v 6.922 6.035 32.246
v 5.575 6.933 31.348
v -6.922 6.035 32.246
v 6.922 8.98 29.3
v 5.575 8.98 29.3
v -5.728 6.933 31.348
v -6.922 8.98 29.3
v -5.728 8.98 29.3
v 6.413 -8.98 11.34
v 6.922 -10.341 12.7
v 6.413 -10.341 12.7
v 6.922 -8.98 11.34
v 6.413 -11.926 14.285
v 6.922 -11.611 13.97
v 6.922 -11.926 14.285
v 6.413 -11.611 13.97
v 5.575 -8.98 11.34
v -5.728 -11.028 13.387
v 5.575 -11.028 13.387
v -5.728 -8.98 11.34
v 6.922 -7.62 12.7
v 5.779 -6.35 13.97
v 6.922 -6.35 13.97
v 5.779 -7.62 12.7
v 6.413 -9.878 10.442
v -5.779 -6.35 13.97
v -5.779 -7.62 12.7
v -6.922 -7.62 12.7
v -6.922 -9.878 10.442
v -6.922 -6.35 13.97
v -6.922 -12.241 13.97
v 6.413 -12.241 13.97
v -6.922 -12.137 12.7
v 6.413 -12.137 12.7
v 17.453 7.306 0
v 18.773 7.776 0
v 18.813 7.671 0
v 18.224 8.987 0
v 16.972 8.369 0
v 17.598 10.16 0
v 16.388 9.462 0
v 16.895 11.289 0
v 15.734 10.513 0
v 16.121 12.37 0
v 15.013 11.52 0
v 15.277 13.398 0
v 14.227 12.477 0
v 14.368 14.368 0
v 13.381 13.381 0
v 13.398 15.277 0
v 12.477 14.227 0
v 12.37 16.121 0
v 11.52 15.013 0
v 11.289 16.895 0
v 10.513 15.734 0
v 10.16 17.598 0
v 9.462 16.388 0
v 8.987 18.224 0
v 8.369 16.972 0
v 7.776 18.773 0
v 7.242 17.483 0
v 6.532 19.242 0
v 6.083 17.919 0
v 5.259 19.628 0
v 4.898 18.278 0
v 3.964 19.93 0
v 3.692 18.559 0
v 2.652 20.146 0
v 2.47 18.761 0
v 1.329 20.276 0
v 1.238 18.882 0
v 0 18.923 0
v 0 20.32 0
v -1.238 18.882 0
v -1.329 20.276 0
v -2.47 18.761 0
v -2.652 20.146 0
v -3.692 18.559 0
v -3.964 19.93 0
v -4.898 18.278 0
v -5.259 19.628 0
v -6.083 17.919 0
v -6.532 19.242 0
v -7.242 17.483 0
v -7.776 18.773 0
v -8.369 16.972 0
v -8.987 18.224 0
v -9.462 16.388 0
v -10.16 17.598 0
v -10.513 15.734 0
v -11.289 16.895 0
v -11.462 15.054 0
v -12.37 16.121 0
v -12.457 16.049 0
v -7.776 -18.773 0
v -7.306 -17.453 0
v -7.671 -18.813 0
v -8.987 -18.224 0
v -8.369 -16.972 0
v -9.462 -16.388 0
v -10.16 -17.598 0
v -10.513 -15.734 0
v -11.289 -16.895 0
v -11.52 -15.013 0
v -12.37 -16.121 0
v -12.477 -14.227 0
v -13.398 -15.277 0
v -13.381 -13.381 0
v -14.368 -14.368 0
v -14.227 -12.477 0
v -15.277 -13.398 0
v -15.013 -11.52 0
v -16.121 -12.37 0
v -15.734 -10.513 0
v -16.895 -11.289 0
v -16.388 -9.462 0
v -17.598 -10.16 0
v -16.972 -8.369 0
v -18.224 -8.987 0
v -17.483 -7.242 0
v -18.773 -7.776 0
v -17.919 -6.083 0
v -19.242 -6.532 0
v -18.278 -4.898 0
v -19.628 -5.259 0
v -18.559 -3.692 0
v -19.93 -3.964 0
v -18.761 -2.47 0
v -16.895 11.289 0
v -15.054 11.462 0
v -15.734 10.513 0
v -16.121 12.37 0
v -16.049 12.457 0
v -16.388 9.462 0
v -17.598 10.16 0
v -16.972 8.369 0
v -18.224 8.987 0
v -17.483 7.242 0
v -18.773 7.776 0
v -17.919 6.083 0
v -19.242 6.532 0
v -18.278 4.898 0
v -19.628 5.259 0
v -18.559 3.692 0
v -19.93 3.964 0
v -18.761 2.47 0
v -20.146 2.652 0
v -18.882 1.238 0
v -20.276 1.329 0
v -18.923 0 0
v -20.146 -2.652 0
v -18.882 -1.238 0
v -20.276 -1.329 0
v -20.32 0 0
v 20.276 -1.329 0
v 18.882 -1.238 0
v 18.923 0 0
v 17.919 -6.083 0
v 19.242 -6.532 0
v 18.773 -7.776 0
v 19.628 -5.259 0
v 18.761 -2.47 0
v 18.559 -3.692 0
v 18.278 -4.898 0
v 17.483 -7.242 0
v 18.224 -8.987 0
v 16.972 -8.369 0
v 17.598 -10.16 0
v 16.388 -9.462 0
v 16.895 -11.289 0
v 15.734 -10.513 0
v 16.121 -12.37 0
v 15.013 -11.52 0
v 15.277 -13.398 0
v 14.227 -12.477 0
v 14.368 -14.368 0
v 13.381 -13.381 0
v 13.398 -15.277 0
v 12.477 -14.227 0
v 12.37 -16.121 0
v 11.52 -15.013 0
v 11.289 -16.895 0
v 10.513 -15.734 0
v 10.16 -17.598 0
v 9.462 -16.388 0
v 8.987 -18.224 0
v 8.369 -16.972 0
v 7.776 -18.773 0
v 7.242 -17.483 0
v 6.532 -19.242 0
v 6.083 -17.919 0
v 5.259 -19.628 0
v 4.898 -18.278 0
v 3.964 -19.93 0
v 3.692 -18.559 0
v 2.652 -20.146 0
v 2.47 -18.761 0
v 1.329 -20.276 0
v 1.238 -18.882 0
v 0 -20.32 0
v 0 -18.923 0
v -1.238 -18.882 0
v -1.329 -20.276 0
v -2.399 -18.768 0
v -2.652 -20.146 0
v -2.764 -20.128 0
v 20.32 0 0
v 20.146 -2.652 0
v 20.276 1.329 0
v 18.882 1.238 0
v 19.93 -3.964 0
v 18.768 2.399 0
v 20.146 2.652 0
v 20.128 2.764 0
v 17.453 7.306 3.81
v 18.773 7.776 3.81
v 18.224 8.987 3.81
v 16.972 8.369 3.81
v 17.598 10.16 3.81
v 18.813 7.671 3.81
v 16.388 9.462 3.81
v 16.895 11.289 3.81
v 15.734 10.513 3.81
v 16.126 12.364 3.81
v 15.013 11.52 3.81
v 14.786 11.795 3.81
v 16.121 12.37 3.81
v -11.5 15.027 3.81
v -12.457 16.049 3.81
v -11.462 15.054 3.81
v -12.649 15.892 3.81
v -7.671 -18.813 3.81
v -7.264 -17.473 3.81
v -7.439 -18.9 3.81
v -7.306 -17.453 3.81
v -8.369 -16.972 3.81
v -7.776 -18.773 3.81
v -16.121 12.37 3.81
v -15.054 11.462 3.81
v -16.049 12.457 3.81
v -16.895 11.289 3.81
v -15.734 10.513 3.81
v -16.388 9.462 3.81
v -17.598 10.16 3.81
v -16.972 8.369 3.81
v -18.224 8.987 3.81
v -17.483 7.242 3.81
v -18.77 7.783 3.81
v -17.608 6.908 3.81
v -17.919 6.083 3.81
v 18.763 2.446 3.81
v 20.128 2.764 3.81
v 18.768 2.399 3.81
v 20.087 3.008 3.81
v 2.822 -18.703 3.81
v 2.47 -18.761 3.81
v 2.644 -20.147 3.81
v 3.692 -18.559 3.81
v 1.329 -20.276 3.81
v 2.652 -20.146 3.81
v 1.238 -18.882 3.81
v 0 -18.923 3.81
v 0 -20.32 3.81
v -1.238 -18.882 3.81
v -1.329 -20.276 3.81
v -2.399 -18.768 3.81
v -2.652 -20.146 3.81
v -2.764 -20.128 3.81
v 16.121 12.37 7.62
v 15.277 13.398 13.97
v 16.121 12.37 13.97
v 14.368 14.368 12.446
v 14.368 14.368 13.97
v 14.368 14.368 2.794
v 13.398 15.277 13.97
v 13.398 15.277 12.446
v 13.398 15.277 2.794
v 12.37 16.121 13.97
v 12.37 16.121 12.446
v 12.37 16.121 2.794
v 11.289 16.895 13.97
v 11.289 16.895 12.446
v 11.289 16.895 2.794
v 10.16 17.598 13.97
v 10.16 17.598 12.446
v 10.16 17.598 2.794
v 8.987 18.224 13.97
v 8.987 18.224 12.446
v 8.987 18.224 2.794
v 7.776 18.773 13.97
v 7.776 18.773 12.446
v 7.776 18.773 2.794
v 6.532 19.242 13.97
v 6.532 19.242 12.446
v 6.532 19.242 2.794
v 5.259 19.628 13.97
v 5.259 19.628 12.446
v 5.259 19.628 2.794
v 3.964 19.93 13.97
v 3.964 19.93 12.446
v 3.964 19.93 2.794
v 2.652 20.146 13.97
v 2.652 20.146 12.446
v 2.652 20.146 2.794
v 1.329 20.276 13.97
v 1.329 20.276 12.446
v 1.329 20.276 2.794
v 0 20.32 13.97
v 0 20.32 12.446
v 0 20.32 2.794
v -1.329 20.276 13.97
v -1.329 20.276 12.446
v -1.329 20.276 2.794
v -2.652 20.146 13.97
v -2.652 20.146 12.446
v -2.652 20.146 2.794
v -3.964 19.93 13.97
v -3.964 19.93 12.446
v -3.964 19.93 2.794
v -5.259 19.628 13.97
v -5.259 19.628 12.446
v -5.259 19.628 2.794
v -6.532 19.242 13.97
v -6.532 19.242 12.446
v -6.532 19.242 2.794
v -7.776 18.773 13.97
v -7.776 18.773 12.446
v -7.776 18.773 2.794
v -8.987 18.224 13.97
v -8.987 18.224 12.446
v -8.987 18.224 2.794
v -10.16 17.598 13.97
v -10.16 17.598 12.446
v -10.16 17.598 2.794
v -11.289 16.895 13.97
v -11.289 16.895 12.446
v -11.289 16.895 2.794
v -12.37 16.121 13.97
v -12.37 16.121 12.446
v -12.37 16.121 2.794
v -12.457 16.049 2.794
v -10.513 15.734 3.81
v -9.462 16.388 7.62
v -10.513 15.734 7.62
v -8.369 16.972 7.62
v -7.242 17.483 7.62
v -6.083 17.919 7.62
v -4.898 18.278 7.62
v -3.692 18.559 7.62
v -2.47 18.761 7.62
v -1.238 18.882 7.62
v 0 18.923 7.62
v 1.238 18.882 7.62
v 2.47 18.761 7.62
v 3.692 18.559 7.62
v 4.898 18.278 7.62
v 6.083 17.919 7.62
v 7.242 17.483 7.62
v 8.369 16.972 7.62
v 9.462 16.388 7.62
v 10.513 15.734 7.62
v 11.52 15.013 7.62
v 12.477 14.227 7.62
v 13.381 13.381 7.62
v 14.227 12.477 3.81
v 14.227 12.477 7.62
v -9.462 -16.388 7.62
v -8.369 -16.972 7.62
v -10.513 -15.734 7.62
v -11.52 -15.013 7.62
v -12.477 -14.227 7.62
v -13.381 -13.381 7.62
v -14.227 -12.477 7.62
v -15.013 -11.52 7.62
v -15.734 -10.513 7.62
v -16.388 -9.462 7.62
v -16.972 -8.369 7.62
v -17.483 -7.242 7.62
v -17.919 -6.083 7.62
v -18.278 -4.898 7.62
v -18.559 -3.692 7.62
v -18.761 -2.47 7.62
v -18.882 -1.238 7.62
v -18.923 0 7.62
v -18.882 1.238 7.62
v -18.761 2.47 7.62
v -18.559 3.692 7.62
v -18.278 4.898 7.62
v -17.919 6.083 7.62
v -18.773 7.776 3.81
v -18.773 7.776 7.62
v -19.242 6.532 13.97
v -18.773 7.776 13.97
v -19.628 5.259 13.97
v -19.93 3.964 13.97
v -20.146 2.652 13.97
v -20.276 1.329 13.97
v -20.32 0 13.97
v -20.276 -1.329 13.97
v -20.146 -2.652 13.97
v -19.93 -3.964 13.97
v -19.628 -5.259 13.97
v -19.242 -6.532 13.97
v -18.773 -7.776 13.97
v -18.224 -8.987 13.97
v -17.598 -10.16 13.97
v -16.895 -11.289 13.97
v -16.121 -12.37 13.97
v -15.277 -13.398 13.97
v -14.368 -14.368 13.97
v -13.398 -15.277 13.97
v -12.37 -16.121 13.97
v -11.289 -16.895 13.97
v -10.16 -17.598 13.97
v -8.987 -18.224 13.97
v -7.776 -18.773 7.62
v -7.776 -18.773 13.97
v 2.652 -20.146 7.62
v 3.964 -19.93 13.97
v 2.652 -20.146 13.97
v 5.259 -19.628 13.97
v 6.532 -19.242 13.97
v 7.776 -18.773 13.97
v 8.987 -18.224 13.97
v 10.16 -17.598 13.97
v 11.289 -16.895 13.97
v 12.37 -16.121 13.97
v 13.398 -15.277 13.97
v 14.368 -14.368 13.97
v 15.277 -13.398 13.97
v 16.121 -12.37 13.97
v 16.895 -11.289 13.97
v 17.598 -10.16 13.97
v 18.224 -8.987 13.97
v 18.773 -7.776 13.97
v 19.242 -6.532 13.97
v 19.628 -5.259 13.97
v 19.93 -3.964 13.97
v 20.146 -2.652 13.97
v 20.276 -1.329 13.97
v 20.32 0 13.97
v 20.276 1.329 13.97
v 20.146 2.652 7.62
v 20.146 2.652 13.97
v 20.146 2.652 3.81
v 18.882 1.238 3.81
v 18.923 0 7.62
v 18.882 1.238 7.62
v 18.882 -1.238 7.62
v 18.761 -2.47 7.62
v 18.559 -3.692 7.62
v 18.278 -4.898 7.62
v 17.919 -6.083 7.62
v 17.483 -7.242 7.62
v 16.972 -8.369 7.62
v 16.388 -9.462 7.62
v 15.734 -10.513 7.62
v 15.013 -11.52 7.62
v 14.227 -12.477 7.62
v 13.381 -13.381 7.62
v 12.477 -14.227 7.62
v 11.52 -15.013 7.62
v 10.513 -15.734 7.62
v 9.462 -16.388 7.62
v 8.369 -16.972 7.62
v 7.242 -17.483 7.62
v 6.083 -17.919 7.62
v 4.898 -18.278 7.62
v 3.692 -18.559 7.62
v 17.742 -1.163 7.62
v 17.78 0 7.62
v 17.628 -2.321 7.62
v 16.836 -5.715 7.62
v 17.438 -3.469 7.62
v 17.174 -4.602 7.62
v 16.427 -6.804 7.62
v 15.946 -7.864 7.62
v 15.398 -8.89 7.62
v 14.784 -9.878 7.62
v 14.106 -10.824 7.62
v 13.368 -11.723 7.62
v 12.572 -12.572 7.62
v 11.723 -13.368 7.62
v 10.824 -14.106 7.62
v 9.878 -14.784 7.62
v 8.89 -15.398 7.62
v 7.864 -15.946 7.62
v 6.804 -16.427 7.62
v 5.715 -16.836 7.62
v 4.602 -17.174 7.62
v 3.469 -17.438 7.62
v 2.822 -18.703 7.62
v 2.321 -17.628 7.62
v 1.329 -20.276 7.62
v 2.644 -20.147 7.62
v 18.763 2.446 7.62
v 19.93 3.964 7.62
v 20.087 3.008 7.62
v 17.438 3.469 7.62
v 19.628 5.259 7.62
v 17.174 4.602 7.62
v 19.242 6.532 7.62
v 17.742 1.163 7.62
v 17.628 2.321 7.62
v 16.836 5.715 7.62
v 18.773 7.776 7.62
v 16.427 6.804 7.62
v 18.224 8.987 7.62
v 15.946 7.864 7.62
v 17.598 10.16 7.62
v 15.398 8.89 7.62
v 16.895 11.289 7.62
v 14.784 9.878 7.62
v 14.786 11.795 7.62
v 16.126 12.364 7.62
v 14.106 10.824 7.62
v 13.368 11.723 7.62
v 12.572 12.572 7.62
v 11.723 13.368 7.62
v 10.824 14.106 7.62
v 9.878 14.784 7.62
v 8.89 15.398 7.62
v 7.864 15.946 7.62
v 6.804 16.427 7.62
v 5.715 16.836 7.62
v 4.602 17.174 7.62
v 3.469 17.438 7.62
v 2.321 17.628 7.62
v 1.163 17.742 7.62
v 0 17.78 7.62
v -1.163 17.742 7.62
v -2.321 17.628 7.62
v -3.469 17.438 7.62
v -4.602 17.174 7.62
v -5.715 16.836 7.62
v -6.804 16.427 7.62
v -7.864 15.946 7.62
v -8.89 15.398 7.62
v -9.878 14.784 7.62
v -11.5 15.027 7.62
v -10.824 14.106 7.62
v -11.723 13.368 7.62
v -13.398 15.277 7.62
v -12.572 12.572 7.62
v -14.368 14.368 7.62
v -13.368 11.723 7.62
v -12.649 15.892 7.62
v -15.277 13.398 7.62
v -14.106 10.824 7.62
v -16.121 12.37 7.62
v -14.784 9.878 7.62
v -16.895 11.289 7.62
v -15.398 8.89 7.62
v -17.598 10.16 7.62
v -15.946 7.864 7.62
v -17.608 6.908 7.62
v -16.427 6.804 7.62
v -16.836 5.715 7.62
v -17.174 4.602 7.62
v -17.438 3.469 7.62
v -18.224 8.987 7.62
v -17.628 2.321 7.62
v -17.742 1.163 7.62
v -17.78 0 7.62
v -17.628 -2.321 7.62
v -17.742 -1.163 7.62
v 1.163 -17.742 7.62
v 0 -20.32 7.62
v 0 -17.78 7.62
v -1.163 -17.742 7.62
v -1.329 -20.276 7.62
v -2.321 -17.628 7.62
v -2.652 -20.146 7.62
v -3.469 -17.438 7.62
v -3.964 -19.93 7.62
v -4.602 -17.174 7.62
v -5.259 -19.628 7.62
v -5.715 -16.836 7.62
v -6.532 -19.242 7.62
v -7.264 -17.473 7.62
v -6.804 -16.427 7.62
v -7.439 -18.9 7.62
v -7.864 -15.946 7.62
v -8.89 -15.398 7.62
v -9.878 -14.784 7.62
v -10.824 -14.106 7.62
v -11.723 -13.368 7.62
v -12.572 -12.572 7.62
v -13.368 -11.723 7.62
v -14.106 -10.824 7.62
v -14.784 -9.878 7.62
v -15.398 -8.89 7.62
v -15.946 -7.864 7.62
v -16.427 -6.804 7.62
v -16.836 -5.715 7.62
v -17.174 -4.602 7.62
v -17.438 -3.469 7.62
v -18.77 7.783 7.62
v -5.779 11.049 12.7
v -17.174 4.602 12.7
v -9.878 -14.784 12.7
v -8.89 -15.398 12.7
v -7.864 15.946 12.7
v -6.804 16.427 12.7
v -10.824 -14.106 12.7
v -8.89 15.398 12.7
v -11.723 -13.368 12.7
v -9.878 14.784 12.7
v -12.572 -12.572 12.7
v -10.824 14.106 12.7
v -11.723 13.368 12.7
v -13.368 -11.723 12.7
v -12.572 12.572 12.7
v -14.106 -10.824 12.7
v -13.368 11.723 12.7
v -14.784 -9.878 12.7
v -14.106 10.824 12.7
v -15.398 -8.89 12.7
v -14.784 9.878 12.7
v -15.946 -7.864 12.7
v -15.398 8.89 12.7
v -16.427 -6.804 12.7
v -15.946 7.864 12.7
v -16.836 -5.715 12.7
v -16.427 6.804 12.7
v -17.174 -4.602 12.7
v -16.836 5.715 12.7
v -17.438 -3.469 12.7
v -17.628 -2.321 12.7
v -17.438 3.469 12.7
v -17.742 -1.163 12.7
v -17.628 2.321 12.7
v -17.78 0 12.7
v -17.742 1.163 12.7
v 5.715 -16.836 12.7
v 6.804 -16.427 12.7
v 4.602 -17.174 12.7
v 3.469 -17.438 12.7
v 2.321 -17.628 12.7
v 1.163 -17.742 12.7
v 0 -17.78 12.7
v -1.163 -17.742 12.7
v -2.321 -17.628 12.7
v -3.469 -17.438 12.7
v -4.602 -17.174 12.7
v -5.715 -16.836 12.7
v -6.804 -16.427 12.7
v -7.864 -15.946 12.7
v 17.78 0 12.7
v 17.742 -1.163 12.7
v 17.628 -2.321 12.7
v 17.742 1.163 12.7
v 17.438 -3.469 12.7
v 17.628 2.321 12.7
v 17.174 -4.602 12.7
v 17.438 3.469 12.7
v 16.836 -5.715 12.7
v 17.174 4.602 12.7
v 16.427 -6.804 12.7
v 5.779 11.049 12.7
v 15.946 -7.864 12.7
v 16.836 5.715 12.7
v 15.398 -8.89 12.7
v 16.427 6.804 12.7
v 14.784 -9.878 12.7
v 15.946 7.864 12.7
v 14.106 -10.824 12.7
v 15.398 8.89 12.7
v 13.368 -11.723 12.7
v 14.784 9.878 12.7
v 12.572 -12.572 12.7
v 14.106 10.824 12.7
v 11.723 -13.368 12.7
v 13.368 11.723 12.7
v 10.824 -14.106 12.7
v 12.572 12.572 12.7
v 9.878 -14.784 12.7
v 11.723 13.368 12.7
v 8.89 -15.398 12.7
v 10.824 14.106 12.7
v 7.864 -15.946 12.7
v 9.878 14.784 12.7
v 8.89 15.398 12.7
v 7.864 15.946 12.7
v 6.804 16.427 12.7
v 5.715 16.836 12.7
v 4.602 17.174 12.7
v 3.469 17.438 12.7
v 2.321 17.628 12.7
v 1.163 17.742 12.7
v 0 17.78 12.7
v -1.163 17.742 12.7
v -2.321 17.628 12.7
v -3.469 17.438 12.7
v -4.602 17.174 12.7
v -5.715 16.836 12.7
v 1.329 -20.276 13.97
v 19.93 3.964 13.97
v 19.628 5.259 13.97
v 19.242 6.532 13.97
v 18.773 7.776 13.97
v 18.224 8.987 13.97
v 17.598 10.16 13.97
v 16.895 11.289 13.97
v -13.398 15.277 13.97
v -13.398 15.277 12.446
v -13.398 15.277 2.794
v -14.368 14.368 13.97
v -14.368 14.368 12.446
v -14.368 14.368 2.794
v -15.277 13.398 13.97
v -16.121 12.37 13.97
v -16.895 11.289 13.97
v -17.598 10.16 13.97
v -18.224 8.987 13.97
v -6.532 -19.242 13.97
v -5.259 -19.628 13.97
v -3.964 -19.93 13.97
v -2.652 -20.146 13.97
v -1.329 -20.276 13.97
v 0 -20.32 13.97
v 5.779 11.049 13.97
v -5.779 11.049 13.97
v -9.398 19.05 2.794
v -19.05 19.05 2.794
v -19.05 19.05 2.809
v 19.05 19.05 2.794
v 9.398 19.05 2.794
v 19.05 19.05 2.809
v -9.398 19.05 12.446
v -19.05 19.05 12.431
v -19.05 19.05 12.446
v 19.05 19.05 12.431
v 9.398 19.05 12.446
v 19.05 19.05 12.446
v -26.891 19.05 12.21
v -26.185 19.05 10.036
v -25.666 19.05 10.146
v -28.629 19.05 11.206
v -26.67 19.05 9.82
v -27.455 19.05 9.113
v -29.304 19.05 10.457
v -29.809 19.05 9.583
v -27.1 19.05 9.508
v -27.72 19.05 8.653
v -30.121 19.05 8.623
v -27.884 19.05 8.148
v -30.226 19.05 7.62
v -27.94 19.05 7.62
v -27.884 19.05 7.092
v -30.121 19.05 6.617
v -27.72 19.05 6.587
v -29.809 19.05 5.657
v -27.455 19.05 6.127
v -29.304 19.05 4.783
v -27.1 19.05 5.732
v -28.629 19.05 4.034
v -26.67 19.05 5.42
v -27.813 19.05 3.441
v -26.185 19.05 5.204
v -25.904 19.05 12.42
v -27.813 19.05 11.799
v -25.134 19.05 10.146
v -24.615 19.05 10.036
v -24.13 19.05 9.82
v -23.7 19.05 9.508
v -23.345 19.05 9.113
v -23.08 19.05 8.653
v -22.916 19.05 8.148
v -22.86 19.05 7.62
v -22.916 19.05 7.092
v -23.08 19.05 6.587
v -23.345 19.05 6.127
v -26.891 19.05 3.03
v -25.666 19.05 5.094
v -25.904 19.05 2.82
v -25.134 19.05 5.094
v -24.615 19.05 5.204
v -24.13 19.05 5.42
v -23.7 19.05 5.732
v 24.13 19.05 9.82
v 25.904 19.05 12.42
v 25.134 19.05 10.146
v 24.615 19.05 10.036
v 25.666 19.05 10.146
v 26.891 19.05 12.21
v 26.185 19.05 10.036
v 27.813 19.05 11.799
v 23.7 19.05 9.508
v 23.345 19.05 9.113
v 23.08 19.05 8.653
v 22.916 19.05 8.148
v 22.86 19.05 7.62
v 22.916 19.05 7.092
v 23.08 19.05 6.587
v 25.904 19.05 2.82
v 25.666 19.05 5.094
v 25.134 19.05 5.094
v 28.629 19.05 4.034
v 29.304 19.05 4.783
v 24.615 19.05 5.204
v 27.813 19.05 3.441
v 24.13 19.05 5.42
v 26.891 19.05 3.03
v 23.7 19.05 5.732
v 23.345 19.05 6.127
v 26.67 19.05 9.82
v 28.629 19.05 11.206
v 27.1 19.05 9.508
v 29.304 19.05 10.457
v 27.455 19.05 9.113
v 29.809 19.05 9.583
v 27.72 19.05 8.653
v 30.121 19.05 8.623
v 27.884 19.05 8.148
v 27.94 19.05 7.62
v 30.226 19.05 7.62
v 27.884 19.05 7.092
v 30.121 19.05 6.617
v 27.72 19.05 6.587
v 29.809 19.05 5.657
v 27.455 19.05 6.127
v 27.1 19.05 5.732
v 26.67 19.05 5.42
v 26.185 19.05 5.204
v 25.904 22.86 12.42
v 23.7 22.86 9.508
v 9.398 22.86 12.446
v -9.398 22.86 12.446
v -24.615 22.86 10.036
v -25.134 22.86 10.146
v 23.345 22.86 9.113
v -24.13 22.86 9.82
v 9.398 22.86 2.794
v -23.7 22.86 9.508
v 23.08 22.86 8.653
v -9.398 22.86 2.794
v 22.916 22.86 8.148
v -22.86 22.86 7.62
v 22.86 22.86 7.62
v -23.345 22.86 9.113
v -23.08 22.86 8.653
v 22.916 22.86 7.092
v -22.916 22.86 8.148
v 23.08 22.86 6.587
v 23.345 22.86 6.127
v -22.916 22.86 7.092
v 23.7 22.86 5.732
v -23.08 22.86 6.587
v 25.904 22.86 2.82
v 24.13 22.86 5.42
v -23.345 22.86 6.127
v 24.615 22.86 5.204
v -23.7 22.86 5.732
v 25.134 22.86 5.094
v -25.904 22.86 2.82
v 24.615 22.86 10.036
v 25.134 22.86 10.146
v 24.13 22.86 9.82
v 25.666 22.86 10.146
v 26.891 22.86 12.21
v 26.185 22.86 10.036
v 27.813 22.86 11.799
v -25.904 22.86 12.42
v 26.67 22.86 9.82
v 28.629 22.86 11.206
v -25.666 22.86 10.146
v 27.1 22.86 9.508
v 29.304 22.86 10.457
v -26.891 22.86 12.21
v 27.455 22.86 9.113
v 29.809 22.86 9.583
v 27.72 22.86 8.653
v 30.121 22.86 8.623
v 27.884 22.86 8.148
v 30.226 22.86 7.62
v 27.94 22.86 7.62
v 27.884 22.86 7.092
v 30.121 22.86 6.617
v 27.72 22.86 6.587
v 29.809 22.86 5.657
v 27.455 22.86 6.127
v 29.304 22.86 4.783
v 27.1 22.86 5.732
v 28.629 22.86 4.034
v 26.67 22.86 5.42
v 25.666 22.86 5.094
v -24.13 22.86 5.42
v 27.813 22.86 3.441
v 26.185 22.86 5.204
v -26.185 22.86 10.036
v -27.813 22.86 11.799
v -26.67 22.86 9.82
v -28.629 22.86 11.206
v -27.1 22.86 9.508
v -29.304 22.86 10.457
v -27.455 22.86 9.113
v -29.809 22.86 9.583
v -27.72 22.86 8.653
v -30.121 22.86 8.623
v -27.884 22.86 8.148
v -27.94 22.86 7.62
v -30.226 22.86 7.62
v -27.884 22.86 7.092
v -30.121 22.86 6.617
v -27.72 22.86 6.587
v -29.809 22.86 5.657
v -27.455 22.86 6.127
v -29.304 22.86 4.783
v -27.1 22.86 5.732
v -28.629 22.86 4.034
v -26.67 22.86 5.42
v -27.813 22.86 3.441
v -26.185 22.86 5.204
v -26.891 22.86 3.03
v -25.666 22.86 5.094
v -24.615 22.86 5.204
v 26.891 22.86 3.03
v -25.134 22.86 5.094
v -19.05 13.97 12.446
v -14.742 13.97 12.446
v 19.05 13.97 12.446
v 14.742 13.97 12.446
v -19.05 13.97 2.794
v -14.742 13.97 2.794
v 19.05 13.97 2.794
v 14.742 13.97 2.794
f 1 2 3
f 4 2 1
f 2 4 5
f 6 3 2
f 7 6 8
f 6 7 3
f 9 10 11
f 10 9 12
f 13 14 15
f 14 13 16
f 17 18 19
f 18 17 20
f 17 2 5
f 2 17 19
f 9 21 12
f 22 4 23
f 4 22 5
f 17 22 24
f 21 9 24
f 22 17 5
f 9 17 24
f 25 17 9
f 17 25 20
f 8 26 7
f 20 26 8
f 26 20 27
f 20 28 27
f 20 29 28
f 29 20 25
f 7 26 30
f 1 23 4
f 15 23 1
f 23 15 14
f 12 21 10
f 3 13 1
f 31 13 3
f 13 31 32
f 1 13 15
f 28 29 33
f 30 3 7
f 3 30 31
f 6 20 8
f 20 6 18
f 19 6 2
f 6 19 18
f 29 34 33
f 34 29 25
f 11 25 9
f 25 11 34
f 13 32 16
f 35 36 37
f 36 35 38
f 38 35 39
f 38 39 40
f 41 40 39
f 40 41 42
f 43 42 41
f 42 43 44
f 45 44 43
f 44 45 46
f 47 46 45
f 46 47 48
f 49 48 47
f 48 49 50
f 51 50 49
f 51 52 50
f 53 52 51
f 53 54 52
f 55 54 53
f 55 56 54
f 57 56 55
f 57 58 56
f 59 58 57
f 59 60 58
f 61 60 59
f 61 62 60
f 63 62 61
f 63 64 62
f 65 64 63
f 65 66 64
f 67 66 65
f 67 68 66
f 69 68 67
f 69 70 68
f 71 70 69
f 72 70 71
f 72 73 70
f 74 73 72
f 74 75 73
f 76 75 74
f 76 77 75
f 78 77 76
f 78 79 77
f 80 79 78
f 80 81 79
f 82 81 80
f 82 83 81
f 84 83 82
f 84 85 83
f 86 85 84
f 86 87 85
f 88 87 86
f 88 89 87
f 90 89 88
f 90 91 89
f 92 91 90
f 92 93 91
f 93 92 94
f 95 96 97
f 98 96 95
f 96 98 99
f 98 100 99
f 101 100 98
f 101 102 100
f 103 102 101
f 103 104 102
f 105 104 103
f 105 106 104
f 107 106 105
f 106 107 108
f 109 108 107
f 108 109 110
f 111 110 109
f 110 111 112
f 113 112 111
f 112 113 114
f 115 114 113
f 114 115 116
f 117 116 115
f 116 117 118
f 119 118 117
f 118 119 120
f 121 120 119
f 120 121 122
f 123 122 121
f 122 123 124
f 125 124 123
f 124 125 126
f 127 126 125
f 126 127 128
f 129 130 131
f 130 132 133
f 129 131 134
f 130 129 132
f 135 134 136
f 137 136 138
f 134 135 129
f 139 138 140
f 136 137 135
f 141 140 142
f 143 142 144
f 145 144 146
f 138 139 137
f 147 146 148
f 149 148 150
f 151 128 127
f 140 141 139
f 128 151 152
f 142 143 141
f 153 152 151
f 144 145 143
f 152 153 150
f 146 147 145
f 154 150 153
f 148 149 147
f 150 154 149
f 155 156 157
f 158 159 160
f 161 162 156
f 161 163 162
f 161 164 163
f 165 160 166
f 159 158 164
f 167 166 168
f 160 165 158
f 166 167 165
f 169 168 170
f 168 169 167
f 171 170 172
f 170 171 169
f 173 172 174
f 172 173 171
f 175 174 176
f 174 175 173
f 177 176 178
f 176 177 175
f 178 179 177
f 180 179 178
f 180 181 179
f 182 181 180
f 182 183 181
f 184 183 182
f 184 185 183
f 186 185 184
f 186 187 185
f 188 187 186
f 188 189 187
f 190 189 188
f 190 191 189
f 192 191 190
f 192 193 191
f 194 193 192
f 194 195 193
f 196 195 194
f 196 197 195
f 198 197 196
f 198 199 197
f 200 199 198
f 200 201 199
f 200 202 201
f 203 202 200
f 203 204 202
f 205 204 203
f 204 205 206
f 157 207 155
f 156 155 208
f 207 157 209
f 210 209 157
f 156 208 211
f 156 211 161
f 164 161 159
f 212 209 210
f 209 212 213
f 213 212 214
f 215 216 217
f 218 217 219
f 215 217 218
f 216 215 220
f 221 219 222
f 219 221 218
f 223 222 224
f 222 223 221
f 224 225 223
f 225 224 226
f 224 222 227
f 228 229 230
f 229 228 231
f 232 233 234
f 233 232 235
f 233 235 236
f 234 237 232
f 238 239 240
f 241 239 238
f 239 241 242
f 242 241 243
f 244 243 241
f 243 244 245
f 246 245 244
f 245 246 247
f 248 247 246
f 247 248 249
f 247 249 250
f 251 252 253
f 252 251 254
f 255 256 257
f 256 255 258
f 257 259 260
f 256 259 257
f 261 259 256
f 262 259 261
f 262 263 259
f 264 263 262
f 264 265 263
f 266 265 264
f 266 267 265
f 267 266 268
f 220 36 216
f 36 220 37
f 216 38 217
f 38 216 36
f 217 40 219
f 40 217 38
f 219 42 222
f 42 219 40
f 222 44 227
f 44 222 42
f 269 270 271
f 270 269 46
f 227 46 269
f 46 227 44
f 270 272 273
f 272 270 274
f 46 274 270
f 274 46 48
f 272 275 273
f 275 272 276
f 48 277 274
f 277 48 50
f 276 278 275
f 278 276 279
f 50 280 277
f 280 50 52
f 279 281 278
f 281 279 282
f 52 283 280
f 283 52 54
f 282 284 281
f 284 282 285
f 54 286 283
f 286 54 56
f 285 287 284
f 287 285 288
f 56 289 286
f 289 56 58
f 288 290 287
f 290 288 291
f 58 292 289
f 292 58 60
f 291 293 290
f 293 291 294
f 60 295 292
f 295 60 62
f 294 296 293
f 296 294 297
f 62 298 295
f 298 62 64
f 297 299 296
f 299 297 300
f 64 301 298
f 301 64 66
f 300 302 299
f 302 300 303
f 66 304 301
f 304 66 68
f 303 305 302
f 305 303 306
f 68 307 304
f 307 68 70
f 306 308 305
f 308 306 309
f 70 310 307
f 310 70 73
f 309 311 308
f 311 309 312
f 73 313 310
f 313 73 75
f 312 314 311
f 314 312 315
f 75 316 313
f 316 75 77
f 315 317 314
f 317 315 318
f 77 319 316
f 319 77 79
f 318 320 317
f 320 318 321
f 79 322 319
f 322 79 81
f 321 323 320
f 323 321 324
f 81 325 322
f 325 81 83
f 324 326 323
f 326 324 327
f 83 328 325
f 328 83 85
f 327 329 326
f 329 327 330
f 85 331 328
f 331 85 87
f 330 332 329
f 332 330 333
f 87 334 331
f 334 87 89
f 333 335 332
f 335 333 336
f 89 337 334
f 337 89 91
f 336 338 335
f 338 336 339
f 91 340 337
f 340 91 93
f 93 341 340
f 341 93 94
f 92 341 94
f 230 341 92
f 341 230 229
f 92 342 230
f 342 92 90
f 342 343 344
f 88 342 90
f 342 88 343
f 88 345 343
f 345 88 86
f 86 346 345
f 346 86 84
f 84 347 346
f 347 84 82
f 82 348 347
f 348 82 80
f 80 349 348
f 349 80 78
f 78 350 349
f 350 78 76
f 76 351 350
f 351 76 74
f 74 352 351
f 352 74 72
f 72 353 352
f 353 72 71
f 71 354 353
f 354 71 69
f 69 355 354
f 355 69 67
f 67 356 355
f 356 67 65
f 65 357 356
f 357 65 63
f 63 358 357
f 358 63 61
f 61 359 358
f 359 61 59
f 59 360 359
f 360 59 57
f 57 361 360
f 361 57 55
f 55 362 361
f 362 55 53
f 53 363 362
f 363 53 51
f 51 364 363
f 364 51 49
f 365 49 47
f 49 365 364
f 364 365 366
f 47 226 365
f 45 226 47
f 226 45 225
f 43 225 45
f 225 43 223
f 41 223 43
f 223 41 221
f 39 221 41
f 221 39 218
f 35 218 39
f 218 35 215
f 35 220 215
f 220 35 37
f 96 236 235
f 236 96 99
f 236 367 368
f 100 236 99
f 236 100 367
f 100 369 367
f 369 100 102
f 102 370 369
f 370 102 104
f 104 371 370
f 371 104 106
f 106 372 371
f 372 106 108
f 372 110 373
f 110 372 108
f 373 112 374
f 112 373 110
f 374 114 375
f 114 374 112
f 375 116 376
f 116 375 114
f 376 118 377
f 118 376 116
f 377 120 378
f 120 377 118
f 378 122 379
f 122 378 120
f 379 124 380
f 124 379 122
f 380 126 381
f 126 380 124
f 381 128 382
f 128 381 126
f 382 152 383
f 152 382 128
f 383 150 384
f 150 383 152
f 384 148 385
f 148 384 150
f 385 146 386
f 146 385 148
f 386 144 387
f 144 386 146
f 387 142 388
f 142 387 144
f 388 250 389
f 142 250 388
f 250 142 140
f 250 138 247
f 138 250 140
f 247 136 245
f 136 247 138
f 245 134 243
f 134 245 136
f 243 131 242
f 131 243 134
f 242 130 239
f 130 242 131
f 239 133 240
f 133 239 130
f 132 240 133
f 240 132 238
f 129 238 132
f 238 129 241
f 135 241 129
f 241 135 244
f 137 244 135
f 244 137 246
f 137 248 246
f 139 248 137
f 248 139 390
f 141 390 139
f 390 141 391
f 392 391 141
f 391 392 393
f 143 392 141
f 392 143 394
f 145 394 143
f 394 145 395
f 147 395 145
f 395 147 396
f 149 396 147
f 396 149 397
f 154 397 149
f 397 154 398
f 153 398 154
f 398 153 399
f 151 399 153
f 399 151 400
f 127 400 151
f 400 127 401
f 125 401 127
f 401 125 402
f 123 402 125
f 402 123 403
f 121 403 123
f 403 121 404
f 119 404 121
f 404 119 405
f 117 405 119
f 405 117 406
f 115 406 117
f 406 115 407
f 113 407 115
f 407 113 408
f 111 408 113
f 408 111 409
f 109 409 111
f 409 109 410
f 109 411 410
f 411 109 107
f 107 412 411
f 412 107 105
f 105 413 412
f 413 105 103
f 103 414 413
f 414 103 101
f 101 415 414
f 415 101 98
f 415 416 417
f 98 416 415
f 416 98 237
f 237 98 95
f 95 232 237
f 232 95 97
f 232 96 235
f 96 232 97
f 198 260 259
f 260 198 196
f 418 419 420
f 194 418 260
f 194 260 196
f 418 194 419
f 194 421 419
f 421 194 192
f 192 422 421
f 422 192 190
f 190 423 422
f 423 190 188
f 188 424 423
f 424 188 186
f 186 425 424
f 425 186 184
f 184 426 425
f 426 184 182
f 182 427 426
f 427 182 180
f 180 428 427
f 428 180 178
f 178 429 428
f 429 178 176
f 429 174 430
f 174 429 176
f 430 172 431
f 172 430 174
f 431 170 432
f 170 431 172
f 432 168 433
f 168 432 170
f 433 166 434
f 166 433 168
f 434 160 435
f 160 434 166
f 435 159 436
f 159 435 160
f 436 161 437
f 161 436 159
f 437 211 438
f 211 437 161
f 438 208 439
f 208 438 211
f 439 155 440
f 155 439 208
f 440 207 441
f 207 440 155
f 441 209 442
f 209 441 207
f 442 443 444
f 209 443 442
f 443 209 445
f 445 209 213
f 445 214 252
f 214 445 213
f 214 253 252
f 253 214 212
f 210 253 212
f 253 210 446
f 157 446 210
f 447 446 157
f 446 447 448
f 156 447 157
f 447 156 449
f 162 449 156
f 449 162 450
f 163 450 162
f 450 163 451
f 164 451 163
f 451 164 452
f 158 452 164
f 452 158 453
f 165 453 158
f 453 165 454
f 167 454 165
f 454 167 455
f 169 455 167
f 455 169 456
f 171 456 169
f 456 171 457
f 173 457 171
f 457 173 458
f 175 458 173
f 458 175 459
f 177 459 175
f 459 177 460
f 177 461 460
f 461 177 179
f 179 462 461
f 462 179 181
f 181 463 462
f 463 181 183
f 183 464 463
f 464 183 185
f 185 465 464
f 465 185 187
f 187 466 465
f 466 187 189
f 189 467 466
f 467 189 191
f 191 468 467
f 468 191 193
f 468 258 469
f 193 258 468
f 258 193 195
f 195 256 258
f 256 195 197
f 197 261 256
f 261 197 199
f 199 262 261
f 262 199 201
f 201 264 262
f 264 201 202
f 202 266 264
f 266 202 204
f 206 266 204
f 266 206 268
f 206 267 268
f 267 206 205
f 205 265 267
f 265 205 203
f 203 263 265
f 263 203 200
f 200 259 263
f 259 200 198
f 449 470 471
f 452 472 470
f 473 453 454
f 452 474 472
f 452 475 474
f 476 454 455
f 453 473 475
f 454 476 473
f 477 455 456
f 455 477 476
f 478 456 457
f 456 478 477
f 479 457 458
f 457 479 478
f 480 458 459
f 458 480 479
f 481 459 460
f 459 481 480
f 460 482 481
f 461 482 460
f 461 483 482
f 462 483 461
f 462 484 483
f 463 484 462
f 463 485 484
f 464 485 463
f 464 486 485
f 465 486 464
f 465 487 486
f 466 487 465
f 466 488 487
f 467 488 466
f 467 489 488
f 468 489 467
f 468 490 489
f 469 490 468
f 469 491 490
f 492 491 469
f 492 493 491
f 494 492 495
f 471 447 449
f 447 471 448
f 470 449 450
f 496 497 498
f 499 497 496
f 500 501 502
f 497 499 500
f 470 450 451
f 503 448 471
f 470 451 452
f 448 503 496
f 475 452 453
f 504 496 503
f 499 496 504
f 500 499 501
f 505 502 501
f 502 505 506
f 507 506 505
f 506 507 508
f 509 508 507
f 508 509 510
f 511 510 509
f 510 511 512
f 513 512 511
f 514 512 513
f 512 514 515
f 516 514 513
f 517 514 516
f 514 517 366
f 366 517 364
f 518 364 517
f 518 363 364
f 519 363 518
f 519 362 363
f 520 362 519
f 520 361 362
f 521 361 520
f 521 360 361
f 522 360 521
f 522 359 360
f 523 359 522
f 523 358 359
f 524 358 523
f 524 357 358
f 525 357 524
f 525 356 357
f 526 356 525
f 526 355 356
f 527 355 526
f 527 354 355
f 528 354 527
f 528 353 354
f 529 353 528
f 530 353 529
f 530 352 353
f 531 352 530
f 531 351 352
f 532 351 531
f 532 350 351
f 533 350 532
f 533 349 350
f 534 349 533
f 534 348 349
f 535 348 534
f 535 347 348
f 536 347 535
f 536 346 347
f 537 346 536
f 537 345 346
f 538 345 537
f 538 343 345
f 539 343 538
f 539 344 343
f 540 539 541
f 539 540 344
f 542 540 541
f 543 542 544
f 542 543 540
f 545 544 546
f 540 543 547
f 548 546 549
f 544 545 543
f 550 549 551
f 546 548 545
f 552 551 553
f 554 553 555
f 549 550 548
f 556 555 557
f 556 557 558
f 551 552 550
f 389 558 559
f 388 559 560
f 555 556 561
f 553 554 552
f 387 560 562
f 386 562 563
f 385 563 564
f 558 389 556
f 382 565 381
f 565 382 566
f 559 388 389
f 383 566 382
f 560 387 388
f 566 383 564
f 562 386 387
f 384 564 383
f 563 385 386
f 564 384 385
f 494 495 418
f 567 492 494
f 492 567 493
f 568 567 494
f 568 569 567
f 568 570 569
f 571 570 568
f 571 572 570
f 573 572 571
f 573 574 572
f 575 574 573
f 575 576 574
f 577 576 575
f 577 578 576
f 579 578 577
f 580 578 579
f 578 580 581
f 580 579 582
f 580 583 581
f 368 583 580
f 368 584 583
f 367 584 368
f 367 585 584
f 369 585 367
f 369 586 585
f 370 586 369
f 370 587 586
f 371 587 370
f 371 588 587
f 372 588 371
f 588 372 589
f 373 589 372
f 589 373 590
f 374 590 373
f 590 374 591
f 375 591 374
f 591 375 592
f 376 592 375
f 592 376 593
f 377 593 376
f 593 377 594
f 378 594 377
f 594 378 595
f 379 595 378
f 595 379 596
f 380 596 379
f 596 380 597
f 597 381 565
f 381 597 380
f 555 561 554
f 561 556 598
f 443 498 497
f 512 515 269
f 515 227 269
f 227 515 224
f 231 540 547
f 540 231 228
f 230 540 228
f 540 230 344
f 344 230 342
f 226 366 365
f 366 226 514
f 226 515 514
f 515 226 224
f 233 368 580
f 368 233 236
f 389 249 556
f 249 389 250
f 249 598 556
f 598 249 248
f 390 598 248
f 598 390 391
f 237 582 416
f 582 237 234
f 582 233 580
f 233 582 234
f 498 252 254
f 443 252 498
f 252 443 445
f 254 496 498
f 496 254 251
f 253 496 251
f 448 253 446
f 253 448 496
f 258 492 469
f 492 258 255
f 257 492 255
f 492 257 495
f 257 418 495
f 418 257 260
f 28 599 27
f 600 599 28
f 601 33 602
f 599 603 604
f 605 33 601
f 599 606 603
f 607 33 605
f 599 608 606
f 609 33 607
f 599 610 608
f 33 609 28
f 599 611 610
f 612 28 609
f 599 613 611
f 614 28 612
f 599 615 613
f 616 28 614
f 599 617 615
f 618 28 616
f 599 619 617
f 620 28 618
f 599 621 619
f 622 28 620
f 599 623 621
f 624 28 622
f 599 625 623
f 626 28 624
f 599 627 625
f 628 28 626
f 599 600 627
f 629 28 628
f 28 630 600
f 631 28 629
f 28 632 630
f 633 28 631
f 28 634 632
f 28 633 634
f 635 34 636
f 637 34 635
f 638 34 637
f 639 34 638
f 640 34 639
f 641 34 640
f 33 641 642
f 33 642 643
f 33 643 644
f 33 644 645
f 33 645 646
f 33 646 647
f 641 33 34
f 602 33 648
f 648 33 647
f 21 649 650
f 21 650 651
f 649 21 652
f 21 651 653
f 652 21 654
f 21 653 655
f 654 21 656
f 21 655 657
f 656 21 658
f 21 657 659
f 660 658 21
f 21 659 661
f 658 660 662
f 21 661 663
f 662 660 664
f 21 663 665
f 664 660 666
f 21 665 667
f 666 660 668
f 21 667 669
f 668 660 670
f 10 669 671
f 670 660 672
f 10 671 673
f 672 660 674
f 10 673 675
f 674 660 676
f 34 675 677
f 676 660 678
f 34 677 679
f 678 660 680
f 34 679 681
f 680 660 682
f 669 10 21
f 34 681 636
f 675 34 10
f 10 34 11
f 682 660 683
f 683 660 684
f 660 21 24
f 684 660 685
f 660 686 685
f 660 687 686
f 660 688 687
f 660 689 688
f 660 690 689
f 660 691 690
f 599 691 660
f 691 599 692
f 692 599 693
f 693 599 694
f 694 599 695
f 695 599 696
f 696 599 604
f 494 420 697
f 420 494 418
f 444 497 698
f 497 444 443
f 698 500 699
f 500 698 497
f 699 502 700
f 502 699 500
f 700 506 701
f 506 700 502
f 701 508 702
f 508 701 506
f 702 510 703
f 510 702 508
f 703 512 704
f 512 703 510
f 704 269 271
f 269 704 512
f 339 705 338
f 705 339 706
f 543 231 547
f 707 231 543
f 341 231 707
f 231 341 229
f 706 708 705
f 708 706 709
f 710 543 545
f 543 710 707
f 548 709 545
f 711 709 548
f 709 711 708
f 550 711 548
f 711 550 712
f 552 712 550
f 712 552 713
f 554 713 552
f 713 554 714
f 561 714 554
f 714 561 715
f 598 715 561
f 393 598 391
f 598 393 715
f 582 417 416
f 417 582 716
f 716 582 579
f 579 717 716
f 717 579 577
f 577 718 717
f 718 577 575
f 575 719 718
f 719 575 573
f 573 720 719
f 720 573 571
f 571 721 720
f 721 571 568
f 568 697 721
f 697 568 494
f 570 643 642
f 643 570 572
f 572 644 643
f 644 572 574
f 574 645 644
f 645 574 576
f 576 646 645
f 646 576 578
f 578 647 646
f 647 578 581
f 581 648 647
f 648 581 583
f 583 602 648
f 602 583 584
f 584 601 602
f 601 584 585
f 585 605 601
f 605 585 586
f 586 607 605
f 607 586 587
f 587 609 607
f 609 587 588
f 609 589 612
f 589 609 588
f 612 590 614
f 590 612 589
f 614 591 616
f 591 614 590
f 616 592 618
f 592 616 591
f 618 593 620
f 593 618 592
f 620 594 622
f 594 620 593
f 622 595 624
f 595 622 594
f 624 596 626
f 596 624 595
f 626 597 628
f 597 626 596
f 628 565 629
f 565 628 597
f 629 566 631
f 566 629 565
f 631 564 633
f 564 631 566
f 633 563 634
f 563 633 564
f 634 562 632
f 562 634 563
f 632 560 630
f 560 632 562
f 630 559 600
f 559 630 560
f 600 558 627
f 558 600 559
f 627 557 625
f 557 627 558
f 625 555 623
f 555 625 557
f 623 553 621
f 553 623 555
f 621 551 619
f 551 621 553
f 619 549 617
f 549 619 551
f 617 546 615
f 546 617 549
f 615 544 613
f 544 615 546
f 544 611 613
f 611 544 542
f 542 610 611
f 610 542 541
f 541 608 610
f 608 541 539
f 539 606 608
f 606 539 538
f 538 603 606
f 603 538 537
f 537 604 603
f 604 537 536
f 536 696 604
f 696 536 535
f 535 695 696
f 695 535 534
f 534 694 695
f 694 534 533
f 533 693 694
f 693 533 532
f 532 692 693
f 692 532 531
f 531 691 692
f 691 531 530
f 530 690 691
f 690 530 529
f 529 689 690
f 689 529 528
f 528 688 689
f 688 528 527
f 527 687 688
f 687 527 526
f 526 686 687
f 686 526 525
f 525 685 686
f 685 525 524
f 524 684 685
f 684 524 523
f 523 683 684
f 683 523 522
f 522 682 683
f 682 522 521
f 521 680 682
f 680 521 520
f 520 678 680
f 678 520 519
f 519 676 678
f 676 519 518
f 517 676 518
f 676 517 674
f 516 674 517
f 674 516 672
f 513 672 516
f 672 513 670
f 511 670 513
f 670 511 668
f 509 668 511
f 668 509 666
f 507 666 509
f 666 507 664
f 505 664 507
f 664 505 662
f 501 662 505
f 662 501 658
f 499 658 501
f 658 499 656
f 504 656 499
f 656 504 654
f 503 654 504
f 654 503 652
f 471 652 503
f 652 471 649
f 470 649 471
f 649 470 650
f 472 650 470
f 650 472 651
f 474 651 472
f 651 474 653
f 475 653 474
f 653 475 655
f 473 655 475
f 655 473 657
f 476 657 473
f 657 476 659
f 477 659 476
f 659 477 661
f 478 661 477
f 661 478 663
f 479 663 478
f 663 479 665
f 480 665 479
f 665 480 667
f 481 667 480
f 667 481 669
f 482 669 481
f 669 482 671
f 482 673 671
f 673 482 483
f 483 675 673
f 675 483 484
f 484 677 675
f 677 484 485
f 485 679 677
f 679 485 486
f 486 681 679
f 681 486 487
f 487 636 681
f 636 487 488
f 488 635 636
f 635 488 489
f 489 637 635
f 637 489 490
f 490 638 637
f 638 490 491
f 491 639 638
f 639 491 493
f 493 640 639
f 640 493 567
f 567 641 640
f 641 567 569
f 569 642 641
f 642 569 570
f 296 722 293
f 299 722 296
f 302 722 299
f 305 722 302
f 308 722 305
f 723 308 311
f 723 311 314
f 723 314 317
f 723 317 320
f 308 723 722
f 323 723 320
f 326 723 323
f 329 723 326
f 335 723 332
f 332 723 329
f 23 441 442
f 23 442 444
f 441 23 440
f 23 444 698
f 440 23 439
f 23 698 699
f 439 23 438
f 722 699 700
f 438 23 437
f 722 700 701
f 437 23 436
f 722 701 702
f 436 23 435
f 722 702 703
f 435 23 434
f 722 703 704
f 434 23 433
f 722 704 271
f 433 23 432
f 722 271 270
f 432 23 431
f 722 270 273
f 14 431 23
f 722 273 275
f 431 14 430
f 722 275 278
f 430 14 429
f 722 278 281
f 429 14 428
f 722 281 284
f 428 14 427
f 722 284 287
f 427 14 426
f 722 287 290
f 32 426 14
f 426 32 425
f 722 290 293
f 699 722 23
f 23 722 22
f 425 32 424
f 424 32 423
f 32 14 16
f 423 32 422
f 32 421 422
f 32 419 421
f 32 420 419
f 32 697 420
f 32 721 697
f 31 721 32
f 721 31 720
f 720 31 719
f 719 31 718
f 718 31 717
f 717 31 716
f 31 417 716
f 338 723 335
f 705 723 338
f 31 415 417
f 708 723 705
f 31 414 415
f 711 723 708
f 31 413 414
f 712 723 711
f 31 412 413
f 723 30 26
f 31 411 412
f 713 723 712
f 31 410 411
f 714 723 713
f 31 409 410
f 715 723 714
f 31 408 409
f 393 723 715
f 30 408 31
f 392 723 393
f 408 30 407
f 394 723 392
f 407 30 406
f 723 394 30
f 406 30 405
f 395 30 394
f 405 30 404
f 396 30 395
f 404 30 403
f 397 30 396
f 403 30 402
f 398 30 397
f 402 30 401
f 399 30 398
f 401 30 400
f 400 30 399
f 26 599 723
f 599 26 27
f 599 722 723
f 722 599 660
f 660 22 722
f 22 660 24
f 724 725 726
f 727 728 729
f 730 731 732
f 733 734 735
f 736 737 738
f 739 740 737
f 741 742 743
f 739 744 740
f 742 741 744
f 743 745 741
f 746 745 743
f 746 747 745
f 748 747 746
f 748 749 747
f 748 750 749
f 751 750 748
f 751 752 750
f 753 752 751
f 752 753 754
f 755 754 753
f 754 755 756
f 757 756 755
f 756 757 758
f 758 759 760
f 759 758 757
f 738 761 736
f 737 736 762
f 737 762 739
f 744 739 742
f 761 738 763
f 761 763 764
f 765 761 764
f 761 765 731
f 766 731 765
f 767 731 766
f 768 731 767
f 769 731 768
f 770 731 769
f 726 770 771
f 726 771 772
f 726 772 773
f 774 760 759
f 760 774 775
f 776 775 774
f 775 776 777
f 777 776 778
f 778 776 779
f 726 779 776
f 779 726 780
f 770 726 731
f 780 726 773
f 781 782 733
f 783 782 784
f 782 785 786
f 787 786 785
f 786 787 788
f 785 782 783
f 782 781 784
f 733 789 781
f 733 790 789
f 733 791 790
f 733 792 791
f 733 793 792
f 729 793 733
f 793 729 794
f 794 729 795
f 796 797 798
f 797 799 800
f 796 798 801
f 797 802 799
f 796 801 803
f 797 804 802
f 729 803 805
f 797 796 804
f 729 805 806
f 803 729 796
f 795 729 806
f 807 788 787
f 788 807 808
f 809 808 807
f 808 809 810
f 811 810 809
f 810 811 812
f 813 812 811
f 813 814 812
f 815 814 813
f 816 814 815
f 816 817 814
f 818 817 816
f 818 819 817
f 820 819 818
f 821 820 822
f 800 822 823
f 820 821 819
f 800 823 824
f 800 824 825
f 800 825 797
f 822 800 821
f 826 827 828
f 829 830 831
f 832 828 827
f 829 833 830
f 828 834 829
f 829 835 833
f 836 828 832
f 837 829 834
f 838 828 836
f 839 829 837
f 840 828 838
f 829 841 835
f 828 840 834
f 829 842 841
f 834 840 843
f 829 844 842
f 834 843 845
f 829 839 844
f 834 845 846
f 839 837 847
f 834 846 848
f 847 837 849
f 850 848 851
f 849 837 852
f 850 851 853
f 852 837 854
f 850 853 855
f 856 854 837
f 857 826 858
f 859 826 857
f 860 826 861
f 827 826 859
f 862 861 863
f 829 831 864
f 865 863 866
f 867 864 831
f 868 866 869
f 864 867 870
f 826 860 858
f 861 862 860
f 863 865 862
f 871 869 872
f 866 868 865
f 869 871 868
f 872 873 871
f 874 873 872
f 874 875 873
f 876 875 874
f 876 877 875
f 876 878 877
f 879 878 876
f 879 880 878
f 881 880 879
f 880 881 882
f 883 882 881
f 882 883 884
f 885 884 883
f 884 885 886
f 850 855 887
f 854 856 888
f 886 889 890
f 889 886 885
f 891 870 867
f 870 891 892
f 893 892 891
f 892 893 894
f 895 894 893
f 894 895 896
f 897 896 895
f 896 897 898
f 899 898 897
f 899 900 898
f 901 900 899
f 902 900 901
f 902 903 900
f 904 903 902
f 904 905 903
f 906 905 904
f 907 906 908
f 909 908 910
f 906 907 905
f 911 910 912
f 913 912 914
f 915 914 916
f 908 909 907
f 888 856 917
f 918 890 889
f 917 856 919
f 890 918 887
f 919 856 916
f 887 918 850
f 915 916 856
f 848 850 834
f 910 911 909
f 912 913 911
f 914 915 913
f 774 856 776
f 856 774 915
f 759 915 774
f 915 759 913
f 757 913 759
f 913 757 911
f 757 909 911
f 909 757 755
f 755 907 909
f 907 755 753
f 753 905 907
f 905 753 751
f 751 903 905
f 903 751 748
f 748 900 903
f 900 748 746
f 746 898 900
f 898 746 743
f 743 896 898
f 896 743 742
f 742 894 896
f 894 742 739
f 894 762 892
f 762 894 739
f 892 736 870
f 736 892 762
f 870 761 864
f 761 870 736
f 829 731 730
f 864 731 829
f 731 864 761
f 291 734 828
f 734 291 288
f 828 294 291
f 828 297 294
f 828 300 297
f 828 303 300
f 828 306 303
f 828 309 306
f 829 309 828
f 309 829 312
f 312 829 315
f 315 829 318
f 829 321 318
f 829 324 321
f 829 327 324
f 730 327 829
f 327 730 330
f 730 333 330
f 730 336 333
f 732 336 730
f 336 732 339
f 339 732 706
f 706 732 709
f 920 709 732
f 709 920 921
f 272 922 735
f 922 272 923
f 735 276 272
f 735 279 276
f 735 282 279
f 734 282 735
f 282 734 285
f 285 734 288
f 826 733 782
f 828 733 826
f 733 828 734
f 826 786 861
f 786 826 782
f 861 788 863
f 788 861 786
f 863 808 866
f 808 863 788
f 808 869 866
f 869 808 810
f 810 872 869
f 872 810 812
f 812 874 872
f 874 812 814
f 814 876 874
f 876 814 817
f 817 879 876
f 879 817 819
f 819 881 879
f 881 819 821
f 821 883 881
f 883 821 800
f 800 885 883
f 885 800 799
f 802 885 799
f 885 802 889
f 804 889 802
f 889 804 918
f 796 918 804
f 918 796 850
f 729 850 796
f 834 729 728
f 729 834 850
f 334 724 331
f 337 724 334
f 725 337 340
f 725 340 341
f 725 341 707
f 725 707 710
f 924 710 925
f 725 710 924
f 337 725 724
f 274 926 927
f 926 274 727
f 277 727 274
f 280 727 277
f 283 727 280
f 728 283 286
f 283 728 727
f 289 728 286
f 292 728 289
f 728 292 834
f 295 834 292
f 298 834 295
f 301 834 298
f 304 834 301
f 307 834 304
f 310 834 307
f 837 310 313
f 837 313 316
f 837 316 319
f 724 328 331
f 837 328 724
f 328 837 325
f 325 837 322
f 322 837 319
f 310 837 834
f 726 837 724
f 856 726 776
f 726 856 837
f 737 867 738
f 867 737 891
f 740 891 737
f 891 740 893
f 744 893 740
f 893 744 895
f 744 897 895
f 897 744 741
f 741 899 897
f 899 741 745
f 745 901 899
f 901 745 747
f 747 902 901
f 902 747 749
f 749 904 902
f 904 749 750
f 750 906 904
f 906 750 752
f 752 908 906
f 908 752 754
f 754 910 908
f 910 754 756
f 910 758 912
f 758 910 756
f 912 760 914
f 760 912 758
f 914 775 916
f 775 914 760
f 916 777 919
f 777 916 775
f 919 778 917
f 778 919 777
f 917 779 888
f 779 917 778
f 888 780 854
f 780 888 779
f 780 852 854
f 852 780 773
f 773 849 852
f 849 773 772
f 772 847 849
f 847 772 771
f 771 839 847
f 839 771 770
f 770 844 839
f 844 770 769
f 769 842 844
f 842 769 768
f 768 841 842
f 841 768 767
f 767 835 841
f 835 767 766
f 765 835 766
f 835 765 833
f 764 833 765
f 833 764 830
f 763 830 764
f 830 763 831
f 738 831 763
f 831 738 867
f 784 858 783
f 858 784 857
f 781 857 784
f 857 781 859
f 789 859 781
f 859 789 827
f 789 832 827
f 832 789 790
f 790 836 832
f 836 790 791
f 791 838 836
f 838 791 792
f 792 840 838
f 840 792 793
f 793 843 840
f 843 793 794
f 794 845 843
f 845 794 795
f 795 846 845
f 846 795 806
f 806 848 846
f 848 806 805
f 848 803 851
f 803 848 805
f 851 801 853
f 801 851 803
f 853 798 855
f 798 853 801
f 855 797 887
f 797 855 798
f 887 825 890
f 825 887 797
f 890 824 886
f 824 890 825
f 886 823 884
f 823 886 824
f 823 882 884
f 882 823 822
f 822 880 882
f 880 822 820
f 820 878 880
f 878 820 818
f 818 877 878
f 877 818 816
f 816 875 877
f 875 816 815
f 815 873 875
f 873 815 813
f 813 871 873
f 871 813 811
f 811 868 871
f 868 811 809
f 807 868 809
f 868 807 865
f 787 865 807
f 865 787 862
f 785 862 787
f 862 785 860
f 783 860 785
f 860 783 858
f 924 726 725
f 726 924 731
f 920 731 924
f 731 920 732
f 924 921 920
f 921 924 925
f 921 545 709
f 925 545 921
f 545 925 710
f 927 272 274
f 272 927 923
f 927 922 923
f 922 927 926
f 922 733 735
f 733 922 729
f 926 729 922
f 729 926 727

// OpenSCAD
ViewScale = [0.0254, 0.0254, 0.0254];

module cutouts()
{
   difference() {
        circle(1600/2, $fn=96);
        circle(1490/2, $fn=96);
        // tab
        rotate([0, 0, 45]) 
        translate([0, 700, 0])
        square([200, 200], center=true);
        // tab
        rotate([0, 0, 165]) 
        translate([0, 700, 0])
        square([200, 200], center=true);
        // tab
        rotate([0, 0, 285]) 
        translate([0, 700, 0])
        square([200, 200], center=true);
    }
}

module cutouts2()
{
   difference() {
        circle(1600/2, $fn=96);
        circle(1490/2, $fn=96);
        // tab
        rotate([0, 0, 53]) 
        translate([0, 700, 0])
        square([400, 200], center=true);
        // tab
        rotate([0, 0, 173]) 
        translate([0, 700, 0])
        square([400, 200], center=true);
        // tab
        //#rotate([0, 0, 240]) 
        rotate([0, 0, 293]) 
        translate([0, 700, 0])
        square([400, 200], center=true);
    }
}

module bodymain()
{
    difference() {
        circle(1600/2, $fn=96);
        circle(1400/2, $fn=96);
    }
}

//module bodycutout()
//{
//    difference() {
//        circle(1460/2, $fn=96);
//        circle(1360/2, $fn=96);
//        *square([1020, 1020], center=true);
//        translate([0, 700, 0])
//        square([400, 200], center=true);
//        scale([1.3,1.3,1.3])
//        translate([0, 500, 0])
//        square([400, 200], center=true);
//        //rotcutouts();
//    }
//}

module bodycutout2()
{
    difference() {
        circle(1460/2, $fn=96);
        circle(1360/2, $fn=96);
        scale([1.3,1.3,1.3])
        translate([0, 500, 0])
        square([400, 200], center=true);
        //rotcutouts();
    }
}

//module ledframe2()
//{
//    difference() {
//    square([1030, 1030], center=true);
//    square([800, 800], center=true);
//    rotcutouts();
////    translate([0, 500, 0])
////    square([400, 200], center=true);
//    }
//}
//
//module ledframe1()
//{
//    difference() {
//        square([1030, 1030], center=true);
//        square([900, 900], center=true);
//        rotcutouts();
//    }
//}

//module support()
//{
//    difference() {
//    square([860, 860], center=true);
//    square([760, 760], center=true);
//    }
//}

module mirror()
{
    translate([-525/2, 0, 500])
    rotate([135, 0, 0]) {
        translate([-10, 0, -500]) {
        linear_extrude(1000)
        difference() {
            square([545, 164]);
            translate([94/2, 0, 0])
            square([445, 114]);
        }
        translate([0, 0, 1000])
        linear_extrude(50)
        square([525, 164]);
    }}
}

module cap() 
{
    difference() {
        circle(1600/2, $fn=96);
        square([455, 870], center=true);
    }
}

module vexmount1()
{
    difference() {
        hull() {
            circle(380/2);
            translate([820, 0, 0])
            square([380, 380], center=true);
        }
        circle(200/2);
    }
}


module vexmount()
{
    linear_extrude(150) {
        vexmount1();
        translate([2000, 0, 0])
        rotate([0, 180, 0])
        vexmount1();
    }
}

module mountsupport()
{
    difference() {
        translate([0, 650, 0])
        square([1500, 200], center=true);
        //circle(1490/2, $fn=96);
        circle(1600/2, $fn=96);
    }
}

module tabbedmirrormount()
{

    translate([0, 0, 0])
    linear_extrude(150)
    cutouts();

    translate([0, 0, 150])
    linear_extrude(150)
    cutouts2();

    translate([0, 0, 300])
    linear_extrude(200)
    bodymain();

    translate([0, 0, 500])
    linear_extrude(50)
    cap();

    translate([0, 0, 300])
    mirror();

    #translate([-1000, 750, 300])
    rotate([-90, 0, 0])
    vexmount();

    translate([0, 0, 110])
    linear_extrude(380)
    mountsupport();

}

module tab()
{
    // tab big bit
    *linear_extrude(160)
    intersection() {
        difference() {
            circle(1660/2, $fn=96);
            circle(1460/2, $fn=96);
        }
        rotate([0, 0, 52]) 
        translate([0, 700, 0])
        square([380, 260], center=true);
    }
    //translate([0, 0, 160])
    // tab little bit
    linear_extrude(130)
    intersection() {
        difference() {
            circle(1600/2, $fn=96);
            circle(1460/2, $fn=96);
        }
        rotate([0, 0, 45]) 
        translate([0, 700, 0])
        square([180, 300], center=true);
    }
}

module tabs()
{
    tab();
    rotate([0, 0, 120])
    tab();
    rotate([0, 0, 240])
    tab();
}

module tabbedlensmount() 
{
    // base
    linear_extrude(300)
    difference() {
        circle(1460/2, $fn=96);
        circle(1360/2, $fn=96);
    }

    // support1
    linear_extrude(270)
    difference() {
        circle(1330/2, $fn=96);
        circle(1180/2, $fn=96);
    }

    // support2
    linear_extrude(270)
    difference() {
        circle(1150/2, $fn=96);
        circle(1000/2, $fn=96);
    }

    translate([0, 0, 300])
    linear_extrude(50)
    difference() {
        circle(1460/2, $fn=96);
        circle(1010/2, $fn=96);
    }

    translate([0, 0, 350])
    linear_extrude(500) {
        difference() {
            circle(1110/2, $fn=96);
            circle(1010/2, $fn=96);
        }
    }
    translate([0, 0, 10])
    tabs();
}

scale(ViewScale)
{
    //translate([0, 0, 0])
    tabbedmirrormount();
    //translate([0, 0, 300])
    //rotate([180, 0, 45])
    //tabbedlensmount();
}
